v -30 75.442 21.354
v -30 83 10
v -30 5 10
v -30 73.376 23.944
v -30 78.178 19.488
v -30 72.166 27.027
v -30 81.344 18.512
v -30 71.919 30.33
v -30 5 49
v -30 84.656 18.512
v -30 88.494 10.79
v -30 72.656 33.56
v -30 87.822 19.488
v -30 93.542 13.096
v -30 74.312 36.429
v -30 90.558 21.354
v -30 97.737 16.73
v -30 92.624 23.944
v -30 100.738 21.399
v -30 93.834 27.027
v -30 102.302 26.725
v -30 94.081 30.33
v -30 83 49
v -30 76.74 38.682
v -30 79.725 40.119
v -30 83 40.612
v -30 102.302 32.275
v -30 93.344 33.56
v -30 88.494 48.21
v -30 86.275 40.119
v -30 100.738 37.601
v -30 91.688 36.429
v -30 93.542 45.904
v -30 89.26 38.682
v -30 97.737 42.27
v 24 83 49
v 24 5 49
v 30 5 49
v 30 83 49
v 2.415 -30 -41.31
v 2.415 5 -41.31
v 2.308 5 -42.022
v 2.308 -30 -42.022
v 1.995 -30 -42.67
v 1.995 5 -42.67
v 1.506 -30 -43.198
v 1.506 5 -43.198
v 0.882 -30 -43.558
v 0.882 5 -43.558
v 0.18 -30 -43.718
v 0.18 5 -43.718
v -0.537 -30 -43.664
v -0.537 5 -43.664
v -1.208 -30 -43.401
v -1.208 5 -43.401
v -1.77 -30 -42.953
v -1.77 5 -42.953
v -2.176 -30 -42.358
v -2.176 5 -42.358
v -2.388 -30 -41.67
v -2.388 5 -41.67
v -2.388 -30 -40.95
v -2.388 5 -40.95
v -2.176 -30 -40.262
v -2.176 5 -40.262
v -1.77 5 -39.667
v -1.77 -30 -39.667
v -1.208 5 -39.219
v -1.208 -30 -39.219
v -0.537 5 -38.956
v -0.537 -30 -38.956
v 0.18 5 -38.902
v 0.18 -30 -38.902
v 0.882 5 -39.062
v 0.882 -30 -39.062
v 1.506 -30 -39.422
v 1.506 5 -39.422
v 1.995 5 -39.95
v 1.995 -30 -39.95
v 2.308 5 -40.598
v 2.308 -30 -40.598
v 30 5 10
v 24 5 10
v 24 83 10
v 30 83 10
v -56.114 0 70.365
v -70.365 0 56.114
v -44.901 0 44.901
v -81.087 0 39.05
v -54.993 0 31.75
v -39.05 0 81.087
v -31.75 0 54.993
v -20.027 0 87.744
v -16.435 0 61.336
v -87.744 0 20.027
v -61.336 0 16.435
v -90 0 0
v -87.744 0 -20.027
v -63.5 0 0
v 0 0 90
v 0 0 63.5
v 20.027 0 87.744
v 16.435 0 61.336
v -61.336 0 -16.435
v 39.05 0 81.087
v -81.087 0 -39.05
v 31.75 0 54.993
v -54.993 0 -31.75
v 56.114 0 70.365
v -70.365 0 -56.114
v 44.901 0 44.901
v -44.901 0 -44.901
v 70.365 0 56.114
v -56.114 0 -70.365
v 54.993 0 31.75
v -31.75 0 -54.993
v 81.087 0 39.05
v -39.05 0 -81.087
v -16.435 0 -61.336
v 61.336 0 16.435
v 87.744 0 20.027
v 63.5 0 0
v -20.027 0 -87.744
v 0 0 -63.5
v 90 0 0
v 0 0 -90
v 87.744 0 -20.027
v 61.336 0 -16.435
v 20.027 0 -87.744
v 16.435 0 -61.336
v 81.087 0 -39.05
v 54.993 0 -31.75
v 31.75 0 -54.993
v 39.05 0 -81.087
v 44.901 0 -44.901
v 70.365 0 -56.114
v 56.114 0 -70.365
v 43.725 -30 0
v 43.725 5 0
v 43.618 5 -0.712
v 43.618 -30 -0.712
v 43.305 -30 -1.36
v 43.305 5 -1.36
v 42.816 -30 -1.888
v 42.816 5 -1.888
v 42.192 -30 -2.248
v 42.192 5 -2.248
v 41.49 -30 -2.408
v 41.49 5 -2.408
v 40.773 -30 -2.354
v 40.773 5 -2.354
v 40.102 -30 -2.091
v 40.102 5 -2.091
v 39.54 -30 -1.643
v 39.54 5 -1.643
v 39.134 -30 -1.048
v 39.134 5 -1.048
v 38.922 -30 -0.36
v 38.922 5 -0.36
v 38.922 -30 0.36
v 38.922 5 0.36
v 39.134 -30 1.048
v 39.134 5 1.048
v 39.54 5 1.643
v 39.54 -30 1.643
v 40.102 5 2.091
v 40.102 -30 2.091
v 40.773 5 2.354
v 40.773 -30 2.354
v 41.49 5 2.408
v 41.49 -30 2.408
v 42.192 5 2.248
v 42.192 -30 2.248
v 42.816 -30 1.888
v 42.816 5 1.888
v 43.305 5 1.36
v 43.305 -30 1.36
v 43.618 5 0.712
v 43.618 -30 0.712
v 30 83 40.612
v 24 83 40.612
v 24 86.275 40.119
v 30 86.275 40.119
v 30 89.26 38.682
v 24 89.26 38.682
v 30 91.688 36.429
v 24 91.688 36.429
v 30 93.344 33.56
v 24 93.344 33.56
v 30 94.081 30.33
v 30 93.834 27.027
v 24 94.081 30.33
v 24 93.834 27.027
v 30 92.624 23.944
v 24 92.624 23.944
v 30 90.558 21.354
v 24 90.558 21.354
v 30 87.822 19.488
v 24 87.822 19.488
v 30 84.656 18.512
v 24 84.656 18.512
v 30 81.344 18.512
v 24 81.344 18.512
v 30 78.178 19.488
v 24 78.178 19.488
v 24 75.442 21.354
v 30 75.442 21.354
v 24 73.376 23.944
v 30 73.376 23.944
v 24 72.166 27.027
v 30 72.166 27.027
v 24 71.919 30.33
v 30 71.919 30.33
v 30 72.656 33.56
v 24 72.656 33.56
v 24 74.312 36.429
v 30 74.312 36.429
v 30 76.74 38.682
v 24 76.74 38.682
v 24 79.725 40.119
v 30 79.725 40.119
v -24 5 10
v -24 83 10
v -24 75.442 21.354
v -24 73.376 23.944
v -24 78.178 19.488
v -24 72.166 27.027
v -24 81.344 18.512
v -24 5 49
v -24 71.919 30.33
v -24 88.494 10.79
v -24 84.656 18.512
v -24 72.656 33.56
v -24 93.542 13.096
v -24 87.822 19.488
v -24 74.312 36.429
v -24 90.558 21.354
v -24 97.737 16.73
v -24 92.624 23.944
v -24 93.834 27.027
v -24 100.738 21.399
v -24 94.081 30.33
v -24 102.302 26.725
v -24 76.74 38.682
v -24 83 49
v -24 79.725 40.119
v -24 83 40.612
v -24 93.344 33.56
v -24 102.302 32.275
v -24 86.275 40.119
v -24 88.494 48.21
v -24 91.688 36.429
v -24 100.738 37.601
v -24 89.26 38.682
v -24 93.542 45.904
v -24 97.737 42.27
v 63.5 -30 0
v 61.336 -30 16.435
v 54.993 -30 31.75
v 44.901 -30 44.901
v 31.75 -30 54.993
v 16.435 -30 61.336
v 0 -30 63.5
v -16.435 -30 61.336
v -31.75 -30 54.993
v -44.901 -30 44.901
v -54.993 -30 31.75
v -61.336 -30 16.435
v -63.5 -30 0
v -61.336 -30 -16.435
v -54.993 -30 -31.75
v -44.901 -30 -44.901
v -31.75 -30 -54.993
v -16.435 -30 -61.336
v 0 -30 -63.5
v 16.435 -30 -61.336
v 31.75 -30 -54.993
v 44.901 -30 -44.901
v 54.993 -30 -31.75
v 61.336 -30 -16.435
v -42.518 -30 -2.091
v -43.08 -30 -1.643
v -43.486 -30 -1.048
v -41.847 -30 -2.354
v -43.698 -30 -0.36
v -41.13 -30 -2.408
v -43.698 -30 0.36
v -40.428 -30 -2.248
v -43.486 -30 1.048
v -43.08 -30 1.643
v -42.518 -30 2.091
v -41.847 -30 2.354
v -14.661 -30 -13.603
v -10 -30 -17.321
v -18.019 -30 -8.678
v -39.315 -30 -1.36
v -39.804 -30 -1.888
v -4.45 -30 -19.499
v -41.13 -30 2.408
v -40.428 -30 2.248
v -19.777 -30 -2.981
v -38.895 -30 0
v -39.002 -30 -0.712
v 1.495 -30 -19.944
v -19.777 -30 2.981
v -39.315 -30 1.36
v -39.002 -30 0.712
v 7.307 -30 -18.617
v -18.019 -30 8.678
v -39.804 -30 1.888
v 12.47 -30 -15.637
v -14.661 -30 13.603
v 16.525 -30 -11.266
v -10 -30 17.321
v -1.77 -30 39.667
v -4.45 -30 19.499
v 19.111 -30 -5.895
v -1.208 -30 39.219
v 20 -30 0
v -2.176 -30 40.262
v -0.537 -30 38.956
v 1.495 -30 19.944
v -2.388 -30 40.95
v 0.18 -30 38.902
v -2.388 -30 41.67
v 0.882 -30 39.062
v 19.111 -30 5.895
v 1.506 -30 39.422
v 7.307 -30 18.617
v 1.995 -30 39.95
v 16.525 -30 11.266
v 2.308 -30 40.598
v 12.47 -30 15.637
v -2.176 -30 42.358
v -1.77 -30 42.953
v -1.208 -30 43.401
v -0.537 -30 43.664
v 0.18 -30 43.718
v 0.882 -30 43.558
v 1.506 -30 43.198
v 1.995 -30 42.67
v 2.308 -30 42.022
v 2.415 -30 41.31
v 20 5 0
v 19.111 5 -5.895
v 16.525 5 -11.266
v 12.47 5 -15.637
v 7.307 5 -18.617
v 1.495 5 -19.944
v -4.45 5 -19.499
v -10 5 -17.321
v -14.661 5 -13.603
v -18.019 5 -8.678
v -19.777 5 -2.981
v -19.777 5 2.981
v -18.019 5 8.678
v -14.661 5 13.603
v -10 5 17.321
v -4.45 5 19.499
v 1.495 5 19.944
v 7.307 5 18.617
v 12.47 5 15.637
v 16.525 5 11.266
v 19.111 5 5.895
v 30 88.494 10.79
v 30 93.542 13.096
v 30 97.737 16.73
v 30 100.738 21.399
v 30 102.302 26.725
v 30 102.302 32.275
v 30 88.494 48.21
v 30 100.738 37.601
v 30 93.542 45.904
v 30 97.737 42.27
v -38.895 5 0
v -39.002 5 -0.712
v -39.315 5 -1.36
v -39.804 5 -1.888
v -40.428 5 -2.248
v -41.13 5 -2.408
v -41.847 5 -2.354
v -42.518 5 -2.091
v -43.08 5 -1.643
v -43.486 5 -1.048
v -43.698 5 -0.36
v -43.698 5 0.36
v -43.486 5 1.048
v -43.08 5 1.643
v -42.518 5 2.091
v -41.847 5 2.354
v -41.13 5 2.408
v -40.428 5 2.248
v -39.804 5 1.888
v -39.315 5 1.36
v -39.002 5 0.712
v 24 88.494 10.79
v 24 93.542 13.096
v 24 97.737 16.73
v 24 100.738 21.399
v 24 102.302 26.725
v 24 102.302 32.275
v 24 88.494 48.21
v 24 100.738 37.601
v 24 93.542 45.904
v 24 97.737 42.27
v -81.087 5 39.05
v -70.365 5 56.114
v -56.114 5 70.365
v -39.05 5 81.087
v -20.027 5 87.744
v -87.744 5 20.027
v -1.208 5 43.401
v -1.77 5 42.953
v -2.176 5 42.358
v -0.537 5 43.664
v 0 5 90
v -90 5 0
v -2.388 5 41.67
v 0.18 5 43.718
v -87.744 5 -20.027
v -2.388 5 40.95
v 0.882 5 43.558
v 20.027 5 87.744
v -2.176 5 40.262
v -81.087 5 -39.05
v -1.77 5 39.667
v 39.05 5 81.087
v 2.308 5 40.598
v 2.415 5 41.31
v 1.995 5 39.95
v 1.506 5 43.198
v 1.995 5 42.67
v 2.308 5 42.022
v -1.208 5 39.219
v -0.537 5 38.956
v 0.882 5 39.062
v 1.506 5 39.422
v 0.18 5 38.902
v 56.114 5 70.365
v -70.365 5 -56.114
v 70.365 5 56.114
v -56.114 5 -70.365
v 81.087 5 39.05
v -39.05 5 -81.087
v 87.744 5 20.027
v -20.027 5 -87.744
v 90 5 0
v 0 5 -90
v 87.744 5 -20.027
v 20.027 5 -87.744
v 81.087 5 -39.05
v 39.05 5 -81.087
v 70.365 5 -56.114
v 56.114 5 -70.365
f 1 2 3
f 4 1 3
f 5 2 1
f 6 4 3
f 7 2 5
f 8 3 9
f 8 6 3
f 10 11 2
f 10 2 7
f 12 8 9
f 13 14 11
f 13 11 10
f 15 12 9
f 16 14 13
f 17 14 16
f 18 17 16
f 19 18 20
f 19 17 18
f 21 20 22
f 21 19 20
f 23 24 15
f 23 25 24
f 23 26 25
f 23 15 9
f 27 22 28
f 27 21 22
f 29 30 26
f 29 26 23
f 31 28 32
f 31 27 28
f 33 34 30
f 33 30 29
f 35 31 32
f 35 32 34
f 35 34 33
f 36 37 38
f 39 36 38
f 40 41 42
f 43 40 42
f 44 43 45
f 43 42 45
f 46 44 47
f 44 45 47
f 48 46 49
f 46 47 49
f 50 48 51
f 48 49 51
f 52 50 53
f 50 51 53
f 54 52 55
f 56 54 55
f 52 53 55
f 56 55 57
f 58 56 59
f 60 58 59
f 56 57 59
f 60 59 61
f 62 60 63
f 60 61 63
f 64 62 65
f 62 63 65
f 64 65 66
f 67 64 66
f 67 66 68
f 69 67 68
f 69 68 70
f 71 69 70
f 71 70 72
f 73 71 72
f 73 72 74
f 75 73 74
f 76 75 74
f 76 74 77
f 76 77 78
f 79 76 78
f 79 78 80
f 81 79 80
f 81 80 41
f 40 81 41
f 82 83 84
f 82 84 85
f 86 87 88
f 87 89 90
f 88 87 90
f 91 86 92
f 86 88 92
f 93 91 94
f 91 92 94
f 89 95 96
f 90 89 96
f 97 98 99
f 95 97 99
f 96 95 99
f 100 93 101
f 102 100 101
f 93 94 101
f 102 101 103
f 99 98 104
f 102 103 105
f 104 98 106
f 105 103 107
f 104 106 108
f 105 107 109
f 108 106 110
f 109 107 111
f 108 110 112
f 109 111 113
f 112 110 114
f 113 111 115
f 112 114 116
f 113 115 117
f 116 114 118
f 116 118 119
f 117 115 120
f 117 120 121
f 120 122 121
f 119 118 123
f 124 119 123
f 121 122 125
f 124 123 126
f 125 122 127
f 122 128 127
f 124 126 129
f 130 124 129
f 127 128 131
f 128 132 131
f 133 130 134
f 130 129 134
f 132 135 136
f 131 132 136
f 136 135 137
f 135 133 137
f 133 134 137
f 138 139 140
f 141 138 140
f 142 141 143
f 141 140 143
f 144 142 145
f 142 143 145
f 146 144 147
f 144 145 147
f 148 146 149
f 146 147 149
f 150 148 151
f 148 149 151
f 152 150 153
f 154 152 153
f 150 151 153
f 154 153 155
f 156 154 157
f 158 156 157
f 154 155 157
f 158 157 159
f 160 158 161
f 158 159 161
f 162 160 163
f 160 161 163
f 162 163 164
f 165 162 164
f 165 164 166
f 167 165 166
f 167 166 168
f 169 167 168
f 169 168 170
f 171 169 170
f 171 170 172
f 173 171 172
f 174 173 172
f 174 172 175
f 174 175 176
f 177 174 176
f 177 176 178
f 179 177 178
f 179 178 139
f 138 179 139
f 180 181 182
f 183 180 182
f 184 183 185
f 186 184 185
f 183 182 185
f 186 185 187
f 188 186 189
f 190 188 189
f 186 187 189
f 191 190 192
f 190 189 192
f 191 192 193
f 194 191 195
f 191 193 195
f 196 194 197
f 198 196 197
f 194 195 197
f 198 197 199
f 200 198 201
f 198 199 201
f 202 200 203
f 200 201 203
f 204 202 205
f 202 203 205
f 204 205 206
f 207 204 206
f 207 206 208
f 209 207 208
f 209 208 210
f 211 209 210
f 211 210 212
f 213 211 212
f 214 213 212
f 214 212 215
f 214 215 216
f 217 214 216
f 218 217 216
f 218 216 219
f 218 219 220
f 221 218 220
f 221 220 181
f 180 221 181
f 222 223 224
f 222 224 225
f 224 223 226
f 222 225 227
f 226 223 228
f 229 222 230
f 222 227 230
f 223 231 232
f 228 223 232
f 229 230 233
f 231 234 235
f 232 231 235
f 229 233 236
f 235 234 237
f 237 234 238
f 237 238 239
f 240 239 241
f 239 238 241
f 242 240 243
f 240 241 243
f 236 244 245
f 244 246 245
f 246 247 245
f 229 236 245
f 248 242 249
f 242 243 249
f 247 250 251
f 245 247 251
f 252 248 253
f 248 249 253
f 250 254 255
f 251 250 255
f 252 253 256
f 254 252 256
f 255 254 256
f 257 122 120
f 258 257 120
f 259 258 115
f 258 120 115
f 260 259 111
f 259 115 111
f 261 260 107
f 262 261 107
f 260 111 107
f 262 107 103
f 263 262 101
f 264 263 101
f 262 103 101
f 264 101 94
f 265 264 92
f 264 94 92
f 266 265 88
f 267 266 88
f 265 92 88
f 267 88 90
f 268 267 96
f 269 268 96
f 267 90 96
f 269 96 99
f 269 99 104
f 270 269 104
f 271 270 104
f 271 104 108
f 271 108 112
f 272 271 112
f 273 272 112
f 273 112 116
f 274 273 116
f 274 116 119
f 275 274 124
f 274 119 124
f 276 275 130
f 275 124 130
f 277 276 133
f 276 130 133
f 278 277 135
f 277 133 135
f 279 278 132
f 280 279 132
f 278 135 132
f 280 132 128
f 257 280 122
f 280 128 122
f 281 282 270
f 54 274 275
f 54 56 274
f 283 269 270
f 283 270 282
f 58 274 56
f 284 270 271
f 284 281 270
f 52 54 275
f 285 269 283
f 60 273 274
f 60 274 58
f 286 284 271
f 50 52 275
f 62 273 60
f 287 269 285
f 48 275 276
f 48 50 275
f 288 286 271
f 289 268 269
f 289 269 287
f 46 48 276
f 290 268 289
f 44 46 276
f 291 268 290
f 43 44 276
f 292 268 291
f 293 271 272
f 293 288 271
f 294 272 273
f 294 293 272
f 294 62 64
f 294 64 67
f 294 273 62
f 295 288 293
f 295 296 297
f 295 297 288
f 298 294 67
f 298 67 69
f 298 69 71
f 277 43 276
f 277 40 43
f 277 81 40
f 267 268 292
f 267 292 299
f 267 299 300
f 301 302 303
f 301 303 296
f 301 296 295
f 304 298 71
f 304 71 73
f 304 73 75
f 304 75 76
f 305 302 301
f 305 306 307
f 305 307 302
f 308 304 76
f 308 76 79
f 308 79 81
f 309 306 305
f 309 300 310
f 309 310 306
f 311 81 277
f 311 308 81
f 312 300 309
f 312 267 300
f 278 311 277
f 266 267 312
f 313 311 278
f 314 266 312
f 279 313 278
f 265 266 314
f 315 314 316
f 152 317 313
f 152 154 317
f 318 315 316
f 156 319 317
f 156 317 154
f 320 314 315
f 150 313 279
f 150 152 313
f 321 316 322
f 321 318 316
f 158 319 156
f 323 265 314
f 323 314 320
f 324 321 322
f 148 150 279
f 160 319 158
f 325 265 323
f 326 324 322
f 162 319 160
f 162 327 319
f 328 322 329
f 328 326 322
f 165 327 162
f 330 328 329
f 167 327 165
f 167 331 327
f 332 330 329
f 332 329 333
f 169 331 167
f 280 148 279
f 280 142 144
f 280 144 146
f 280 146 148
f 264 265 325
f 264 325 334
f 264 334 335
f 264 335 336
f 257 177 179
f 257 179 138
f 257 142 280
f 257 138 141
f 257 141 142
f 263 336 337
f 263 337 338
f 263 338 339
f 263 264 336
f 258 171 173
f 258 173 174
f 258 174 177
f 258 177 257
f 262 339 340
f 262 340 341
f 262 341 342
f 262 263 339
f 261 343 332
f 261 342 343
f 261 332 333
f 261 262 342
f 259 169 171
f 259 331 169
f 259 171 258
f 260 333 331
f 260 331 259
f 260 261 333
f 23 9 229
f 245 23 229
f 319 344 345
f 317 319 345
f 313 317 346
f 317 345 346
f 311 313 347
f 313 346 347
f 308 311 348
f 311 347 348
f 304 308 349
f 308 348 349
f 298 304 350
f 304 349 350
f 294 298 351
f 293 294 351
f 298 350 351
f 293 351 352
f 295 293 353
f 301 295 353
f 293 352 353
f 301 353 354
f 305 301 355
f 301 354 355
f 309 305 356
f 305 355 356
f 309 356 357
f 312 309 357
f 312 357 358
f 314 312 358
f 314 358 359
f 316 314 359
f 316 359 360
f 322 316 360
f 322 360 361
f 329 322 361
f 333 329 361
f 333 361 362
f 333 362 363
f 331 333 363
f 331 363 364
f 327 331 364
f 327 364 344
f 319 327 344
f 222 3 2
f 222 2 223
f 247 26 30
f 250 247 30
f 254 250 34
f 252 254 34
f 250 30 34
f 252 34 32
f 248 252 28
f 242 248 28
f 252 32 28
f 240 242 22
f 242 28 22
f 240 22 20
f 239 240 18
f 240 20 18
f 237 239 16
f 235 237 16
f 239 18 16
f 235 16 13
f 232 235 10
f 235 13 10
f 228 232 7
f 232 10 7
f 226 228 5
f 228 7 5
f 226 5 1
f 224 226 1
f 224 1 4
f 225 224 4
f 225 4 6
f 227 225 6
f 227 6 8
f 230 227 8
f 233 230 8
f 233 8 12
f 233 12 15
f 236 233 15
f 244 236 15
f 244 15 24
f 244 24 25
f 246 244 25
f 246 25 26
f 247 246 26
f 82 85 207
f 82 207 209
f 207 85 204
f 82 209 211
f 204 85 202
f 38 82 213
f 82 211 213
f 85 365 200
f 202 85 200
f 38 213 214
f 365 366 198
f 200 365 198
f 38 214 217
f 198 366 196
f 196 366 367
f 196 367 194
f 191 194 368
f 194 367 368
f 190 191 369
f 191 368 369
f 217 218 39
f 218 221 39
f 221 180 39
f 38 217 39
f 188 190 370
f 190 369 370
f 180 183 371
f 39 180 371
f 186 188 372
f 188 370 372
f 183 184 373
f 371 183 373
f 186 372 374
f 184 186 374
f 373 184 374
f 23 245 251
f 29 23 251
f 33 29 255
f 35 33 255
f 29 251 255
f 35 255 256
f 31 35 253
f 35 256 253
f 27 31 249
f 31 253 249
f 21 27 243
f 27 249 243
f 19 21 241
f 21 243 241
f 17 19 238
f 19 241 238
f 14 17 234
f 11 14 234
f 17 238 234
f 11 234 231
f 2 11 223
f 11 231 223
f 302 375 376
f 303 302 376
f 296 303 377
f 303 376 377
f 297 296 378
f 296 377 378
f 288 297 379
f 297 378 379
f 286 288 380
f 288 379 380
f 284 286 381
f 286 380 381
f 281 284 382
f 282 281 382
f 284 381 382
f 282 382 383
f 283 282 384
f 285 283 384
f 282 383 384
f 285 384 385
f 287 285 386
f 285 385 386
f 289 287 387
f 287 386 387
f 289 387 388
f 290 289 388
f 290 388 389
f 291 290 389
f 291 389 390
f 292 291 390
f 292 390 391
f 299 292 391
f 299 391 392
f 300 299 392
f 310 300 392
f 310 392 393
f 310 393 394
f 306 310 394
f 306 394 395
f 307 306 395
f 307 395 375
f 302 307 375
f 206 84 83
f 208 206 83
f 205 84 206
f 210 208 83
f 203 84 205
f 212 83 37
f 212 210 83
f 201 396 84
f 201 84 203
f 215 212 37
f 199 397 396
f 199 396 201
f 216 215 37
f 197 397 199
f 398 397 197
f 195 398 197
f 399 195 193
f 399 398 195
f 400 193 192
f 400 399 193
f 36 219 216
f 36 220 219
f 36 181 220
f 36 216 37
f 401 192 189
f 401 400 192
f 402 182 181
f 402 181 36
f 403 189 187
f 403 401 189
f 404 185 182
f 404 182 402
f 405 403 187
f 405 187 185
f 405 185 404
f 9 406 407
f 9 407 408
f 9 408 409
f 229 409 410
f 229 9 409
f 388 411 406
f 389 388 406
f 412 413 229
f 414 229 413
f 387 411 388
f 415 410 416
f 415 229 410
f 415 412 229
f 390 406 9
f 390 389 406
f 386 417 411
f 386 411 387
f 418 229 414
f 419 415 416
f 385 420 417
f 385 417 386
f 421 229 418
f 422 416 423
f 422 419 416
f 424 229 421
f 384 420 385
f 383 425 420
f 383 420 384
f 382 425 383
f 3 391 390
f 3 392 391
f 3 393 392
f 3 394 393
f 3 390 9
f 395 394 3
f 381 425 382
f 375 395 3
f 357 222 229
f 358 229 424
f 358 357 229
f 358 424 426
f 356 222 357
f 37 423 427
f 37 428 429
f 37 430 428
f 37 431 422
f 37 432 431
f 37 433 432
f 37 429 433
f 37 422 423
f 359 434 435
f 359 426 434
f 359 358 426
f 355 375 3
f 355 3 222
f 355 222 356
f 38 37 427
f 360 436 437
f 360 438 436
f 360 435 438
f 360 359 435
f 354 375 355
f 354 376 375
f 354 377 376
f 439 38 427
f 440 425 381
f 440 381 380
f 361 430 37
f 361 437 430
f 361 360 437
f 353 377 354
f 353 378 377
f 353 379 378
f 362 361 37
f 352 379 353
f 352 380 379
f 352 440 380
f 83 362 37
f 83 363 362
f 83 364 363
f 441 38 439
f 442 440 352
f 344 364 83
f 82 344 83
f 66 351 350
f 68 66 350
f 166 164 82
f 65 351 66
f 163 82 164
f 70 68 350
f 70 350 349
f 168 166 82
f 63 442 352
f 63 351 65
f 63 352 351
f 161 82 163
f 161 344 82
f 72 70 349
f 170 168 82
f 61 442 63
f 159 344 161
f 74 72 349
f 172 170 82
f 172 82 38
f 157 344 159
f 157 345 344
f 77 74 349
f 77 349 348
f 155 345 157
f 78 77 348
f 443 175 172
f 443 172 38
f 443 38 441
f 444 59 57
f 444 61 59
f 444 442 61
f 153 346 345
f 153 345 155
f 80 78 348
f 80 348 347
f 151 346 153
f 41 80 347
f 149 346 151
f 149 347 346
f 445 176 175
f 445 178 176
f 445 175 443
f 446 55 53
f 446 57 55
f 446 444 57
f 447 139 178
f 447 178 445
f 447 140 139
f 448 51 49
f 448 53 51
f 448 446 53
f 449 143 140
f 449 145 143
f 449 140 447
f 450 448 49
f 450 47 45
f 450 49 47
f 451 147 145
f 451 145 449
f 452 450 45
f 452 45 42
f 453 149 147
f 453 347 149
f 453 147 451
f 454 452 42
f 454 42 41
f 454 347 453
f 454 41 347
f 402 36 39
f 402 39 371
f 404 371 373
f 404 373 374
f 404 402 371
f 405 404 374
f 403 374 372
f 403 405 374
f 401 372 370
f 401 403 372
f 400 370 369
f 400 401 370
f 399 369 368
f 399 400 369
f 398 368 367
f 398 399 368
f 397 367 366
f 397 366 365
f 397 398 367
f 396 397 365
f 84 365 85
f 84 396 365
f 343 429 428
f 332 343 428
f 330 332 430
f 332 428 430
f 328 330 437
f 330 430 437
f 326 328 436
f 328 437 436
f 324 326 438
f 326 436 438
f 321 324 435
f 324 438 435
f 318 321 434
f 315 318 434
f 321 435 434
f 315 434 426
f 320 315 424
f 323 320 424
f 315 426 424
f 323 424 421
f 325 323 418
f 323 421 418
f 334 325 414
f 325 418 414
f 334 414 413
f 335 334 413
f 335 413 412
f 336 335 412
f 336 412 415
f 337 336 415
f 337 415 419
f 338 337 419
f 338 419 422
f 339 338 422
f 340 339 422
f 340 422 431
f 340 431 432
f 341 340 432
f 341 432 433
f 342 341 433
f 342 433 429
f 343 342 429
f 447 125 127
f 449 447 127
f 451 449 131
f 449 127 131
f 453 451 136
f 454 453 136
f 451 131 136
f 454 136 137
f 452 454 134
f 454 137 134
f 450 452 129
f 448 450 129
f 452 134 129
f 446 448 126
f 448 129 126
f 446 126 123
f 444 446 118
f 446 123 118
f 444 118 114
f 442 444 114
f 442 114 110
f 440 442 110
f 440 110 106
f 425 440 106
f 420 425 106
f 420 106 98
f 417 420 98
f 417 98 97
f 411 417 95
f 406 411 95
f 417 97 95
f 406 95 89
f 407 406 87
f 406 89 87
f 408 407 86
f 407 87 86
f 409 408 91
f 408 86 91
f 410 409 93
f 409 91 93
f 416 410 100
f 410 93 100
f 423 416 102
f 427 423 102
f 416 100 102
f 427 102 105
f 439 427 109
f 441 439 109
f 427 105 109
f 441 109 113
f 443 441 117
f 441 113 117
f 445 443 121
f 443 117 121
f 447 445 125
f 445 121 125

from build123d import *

# Parameters (mm, degrees)
SKETCH_1_R          = 90
EXTRUDE_2_DEPTH     = 5
SKETCH_2_R          = 63.5
EXTRUDE_3_DEPTH     = 30
SKETCH_3_R          = 2.415
CUT_EXTRUDE_1_DEPTH = 36
SKETCH_4_W          = 6
SKETCH_4_H          = 39
EXTRUDE_4_DEPTH     = 78
EXTRUDE_START       = -6
EXTRUDE_5_DEPTH     = 6
EXTRUDE_6_DEPTH     = 6
SKETCH_8_R          = 11.1125
CUT_EXTRUDE_3_DEPTH = 121
SKETCH2_R           = 20
CUT_EXTRUDE1_DEPTH  = 36


with BuildPart() as part:
    # 草圖1 → 填料-伸長2 (new body)
    with BuildSketch(Plane(origin=(0, 0, 0), x_dir=(1, 0, 0), z_dir=(0, 1, 0))):
        Circle(SKETCH_1_R)
    extrude(amount=EXTRUDE_2_DEPTH)

    # 草圖2 → 填料-伸長3 (add)
    with BuildSketch(Plane.XZ):
        Circle(SKETCH_2_R)
    extrude(amount=EXTRUDE_3_DEPTH)

    # 草圖3 → 除料-伸長1 (cut, through all)
    with BuildSketch(Plane(origin=(0, 5, 0), x_dir=(1, 0, 0), z_dir=(0, 1, 0))):
        with Locations((0, 41.31)):
            Circle(SKETCH_3_R)
        with Locations((0, -41.31)):
            Circle(SKETCH_3_R)
        with Locations((-41.31, 0)):
            Circle(SKETCH_3_R)
        with Locations((41.31, 0)):
            Circle(SKETCH_3_R)
    extrude(amount=-CUT_EXTRUDE_1_DEPTH, mode=Mode.SUBTRACT)

    # 草圖4 → 填料-伸長4 (add)
    with BuildSketch(Plane(origin=(0, 5, 0), x_dir=(1, 0, 0), z_dir=(0, 1, 0))):
        with Locations((-27, -29.5)):
            Rectangle(SKETCH_4_W, SKETCH_4_H)
        with Locations((27, -29.5)):
            Rectangle(SKETCH_4_W, SKETCH_4_H)
    extrude(amount=EXTRUDE_4_DEPTH)

    # 草圖5 → 填料-伸長5 (add)
    with BuildSketch(Plane.ZY.offset(30).offset(EXTRUDE_START)):
        with BuildLine():
            Line((10, 83), (49, 83))
            ThreePointArc((49, 83), (29.5, 102.5), (10, 83))
        make_face()
    extrude(amount=EXTRUDE_5_DEPTH)

    # 草圖7 → 填料-伸長6 (add)
    with BuildSketch(Plane.ZY.offset(-24)):
        with BuildLine():
            Line((10, 83), (49, 83))
            ThreePointArc((49, 83), (29.5, 102.5), (10, 83))
        make_face()
    extrude(amount=-EXTRUDE_6_DEPTH)

    # 草圖8 → 除料-伸長3 (cut, through all)
    with BuildSketch(Plane.ZY.offset(30)):
        with Locations((29.5, 83)):
            Circle(SKETCH_8_R)
    extrude(amount=-CUT_EXTRUDE_3_DEPTH, mode=Mode.SUBTRACT)

    # Sketch2 → Cut-Extrude1 (cut, through all)
    with BuildSketch(Plane(origin=(0, 5, 0), x_dir=(1, 0, 0), z_dir=(0, 1, 0))):
        Circle(SKETCH2_R)
    extrude(amount=-CUT_EXTRUDE1_DEPTH, mode=Mode.SUBTRACT)


solid = part.part
